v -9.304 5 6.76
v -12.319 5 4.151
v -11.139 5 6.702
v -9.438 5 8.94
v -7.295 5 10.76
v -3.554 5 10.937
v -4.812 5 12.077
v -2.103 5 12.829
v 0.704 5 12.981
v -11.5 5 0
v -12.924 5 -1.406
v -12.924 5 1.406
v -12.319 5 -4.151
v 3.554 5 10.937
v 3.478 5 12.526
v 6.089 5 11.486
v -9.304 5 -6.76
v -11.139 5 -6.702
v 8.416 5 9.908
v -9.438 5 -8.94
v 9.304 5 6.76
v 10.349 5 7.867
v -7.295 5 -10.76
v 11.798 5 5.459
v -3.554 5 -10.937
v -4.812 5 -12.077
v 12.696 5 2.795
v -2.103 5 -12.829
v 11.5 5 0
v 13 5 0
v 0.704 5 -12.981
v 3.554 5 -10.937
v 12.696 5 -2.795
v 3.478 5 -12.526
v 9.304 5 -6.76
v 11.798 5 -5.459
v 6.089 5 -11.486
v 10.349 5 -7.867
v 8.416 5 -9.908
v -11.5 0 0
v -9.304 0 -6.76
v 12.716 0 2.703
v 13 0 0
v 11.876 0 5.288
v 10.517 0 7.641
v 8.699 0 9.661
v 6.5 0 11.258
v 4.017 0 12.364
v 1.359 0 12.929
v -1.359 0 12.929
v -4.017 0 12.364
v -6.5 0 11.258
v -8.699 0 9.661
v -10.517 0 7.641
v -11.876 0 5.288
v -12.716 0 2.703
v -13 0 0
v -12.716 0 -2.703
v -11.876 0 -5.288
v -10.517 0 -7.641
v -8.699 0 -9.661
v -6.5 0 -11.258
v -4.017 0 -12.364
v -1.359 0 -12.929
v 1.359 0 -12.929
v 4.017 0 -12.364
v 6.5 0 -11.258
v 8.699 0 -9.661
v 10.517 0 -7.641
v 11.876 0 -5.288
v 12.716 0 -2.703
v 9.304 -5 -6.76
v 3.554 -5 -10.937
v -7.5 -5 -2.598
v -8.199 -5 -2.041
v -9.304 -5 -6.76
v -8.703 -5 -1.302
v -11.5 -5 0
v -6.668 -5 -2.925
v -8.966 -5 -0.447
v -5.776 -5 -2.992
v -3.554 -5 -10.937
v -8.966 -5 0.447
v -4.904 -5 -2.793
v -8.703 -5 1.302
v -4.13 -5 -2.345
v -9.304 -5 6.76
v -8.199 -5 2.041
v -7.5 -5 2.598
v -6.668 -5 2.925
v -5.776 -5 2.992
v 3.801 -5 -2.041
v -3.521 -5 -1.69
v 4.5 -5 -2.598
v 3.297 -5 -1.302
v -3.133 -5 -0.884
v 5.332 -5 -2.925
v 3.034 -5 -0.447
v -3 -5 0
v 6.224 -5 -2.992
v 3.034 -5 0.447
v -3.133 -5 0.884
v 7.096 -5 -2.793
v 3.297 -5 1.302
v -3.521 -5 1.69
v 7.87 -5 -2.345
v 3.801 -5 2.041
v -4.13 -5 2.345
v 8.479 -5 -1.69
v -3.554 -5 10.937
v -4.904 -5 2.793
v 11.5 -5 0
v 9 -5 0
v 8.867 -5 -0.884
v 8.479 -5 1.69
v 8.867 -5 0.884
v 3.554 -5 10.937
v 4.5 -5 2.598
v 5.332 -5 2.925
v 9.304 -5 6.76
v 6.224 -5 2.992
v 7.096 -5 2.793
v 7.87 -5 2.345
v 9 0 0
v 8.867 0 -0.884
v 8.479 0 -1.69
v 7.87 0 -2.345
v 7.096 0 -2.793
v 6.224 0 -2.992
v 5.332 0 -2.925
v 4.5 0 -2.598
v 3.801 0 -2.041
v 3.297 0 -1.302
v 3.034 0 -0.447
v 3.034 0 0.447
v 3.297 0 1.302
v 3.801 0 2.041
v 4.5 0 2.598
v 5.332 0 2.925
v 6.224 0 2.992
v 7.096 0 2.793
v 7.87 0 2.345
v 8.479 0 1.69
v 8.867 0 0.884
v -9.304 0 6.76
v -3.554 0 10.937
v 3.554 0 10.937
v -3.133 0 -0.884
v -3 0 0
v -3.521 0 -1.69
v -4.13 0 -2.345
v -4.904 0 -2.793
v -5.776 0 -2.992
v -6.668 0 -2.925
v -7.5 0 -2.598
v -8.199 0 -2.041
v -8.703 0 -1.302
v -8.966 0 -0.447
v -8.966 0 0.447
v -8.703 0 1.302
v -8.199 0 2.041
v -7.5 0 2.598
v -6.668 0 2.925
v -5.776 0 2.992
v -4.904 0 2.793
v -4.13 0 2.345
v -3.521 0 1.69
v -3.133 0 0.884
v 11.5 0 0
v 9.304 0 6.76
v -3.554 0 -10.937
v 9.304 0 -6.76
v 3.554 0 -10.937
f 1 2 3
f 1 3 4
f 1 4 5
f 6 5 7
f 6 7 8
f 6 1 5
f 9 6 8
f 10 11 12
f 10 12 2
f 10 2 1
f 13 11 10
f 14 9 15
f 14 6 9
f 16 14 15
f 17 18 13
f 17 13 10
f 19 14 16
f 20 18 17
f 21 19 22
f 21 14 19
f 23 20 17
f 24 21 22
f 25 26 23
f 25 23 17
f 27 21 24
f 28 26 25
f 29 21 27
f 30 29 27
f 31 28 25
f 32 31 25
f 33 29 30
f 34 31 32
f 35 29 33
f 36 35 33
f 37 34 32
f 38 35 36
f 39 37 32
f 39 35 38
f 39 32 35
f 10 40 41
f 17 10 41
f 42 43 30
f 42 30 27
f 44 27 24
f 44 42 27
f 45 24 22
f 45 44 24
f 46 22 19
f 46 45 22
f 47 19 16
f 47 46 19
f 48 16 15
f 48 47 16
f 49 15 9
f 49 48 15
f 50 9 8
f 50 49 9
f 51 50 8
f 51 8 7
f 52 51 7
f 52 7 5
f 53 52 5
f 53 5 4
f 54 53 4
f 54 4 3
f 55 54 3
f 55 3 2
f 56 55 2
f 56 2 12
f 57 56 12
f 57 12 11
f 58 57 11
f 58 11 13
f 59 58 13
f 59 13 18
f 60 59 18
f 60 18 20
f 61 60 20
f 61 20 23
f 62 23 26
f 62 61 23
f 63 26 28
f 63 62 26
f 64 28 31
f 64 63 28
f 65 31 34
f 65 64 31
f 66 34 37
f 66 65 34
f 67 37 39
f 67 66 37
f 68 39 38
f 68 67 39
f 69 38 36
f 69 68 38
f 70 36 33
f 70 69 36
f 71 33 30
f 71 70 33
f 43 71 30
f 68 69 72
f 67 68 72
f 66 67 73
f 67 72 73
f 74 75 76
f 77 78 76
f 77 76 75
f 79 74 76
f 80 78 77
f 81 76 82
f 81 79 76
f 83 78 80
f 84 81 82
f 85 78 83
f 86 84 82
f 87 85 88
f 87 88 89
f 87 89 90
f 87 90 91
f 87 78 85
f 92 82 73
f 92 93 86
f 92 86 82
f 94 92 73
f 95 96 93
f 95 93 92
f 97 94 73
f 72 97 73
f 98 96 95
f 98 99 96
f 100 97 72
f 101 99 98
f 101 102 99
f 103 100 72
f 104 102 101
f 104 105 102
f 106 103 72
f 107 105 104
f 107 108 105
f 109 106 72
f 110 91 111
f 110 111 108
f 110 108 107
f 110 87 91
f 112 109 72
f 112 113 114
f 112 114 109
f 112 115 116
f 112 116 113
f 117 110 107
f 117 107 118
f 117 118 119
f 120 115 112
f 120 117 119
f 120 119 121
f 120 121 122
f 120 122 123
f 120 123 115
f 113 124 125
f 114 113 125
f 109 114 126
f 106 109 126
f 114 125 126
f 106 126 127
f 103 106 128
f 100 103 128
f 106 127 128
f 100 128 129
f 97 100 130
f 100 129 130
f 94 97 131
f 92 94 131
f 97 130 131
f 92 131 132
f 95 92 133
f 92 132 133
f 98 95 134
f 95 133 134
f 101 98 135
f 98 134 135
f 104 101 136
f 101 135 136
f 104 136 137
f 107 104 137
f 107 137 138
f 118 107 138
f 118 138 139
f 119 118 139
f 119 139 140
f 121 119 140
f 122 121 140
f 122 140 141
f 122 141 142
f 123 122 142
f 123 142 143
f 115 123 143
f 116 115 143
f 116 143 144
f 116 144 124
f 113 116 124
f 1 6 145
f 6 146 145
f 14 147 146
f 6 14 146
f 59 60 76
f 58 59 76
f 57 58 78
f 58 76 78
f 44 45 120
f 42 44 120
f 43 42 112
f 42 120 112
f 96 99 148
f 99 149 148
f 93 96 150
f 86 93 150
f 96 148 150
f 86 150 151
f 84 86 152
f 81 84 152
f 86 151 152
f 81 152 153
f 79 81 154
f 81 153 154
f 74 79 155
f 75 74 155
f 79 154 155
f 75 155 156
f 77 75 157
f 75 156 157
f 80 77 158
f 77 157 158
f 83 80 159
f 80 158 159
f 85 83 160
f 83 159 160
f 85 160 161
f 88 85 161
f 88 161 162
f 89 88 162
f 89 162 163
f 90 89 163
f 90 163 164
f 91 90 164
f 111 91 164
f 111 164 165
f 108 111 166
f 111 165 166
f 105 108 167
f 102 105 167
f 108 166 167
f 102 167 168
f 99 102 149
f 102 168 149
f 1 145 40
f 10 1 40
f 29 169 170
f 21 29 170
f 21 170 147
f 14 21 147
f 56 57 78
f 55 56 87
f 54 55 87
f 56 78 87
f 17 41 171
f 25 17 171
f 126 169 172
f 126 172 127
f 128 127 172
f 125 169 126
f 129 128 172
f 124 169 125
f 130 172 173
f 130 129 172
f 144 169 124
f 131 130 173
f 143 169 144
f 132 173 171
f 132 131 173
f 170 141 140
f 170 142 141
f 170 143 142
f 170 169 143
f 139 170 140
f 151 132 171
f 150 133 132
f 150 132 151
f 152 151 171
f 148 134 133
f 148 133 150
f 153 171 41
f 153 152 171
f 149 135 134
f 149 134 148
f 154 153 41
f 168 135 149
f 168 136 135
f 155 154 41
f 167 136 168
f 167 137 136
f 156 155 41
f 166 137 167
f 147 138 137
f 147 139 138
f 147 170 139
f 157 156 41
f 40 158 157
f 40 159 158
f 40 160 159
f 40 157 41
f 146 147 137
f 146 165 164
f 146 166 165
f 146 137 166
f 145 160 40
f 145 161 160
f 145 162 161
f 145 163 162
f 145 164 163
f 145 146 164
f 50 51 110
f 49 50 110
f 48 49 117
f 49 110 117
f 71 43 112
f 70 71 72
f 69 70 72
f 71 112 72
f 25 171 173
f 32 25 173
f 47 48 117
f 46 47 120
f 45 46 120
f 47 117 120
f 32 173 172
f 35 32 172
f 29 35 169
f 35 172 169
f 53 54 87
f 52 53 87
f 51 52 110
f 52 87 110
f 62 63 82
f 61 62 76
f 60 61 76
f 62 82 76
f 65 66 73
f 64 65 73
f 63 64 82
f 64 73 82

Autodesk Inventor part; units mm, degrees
ref_plane "YZ Plane" through (0, 0, 0) normal (1, 0, 0) x (0, 1, 0)
ref_plane "XZ Plane" through (0, 0, 0) normal (0, 1, 0) x (-1, 0, 0)
ref_plane "XY Plane" through (0, 0, 0) normal (0, 0, 1) x (1, 0, 0)
sketch "Sketch1" plane through (0, 0, 0) normal (0, 1, 0) x (-1, 0, 0)
  circle A0 centre (0, 0) radius 13
  line L0 (-11.5, 0) -> (-9.303695, 6.75953) construction
  line L1 (-9.303695, 6.75953) -> (-3.553695, 10.93715) construction
  line L2 (-3.553695, 10.93715) -> (3.553695, 10.93715) construction
  line L3 (3.553695, 10.93715) -> (9.303695, 6.75953) construction
  line L4 (9.303695, 6.75953) -> (11.5, 0) construction
  line L5 (11.5, 0) -> (9.303695, -6.75953) construction
  line L6 (9.303695, -6.75953) -> (3.553695, -10.93715) construction
  line L7 (3.553695, -10.93715) -> (-3.553695, -10.93715) construction
  line L8 (-3.553695, -10.93715) -> (-9.303695, -6.75953) construction
  line L9 (-9.303695, -6.75953) -> (-11.5, 0) construction
  circle A1 centre (-6, 0) radius 3 construction
  circle A2 centre (6, 0) radius 3 construction
  line L10 (13, 0) -> (10.517221, -7.641208) construction
  line L11 (10.517221, -7.641208) -> (4.017221, -12.363735) construction
  line L12 (4.017221, -12.363735) -> (-4.017221, -12.363735) construction
  line L13 (-4.017221, -12.363735) -> (-10.517221, -7.641208) construction
  line L14 (-10.517221, -7.641208) -> (-13, 0) construction
  line L15 (-13, 0) -> (-10.517221, 7.641208) construction
  line L16 (-10.517221, 7.641208) -> (-4.017221, 12.363735) construction
  line L17 (-4.017221, 12.363735) -> (4.017221, 12.363735) construction
  line L18 (4.017221, 12.363735) -> (10.517221, 7.641208) construction
  line L19 (10.517221, 7.641208) -> (13, 0) construction
  dimension "d0" = 26
  dimension "d10" = 6
  dimension "d11" = 6
ref_plane "Work Plane1" through (0, -5, 0) normal (0, -1, 0) x (1, 0, 0)
sketch "Sketch2" plane through (0, -5, 0) normal (0, -1, 0) x (1, 0, 0)
  circle A0 centre (0, 0) radius 13 construction
  line L0 (-9.303695, 6.75953) -> (-11.5, 0)
  line L1 (-11.5, 0) -> (-9.303695, 6.75953)
  line L2 (-9.303695, 6.75953) -> (-3.553695, 10.93715)
  line L3 (-3.553695, 10.93715) -> (3.553695, 10.93715)
  line L4 (3.553695, 10.93715) -> (9.303695, 6.75953)
  line L5 (9.303695, 6.75953) -> (11.5, 0)
  line L6 (11.5, 0) -> (9.303695, -6.75953)
  line L7 (9.303695, -6.75953) -> (3.553695, -10.93715)
  line L8 (3.553695, -10.93715) -> (-3.553695, -10.93715)
  line L9 (-3.553695, -10.93715) -> (-9.303695, -6.75953)
  line L10 (-9.303695, -6.75953) -> (-11.5, 0)
sketch3d "3D Sketch1"
sketch "Sketch1 outline for Loft1" plane through (0, 0, 0) normal (0, 1, 0) x (-1, 0, 0)
  circle A0 centre (0, 0) radius 13
sketch "Sketch2 outline for Loft1" plane through (0, -5, 0) normal (0, -1, 0) x (1, 0, 0)
  line L0 (-11.5, 0) -> (-9.303695, 6.75953)
  line L1 (-9.303695, 6.75953) -> (-3.553695, 10.93715)
  line L2 (-3.553695, 10.93715) -> (3.553695, 10.93715)
  line L3 (3.553695, 10.93715) -> (9.303695, 6.75953)
  line L4 (9.303695, 6.75953) -> (11.5, 0)
  line L5 (11.5, 0) -> (9.303695, -6.75953)
  line L6 (9.303695, -6.75953) -> (3.553695, -10.93715)
  line L7 (3.553695, -10.93715) -> (-3.553695, -10.93715)
  line L8 (-3.553695, -10.93715) -> (-9.303695, -6.75953)
  line L9 (-9.303695, -6.75953) -> (-11.5, 0)
loft "Loft1" add profiles "Sketch1 outline for Loft1", "Sketch2 outline for Loft1"
sketch "Sketch3" plane through (0, 0, 0) normal (0, 1, 0) x (1, 0, 0)
  circle A0 centre (0, 0) radius 13
  line L0 (-11.5, 0) -> (-9.303695, 6.75953)
  line L1 (-9.303695, 6.75953) -> (-3.553695, 10.93715)
  line L2 (-3.553695, 10.93715) -> (3.553695, 10.93715)
  line L3 (3.553695, 10.93715) -> (9.303695, 6.75953)
  line L4 (9.303695, 6.75953) -> (11.5, 0)
  line L5 (11.5, 0) -> (9.303695, -6.75953)
  line L6 (9.303695, -6.75953) -> (3.553695, -10.93715)
  line L7 (3.553695, -10.93715) -> (-3.553695, -10.93715)
  line L8 (-3.553695, -10.93715) -> (-9.303695, -6.75953)
  line L9 (-9.303695, -6.75953) -> (-11.5, 0)
  circle A1 centre (0, 0) radius 13
  line L10 (-11.5, 0) -> (-9.303695, 6.75953)
  line L11 (-9.303695, 6.75953) -> (-3.553695, 10.93715)
  line L12 (-3.553695, 10.93715) -> (3.553695, 10.93715)
  line L13 (3.553695, 10.93715) -> (9.303695, 6.75953)
  line L14 (9.303695, 6.75953) -> (11.5, 0)
  line L15 (11.5, 0) -> (9.303695, -6.75953)
  line L16 (9.303695, -6.75953) -> (3.553695, -10.93715)
  line L17 (3.553695, -10.93715) -> (-3.553695, -10.93715)
  line L18 (-3.553695, -10.93715) -> (-9.303695, -6.75953)
  line L19 (-9.303695, -6.75953) -> (-11.5, 0)
  circle A2 centre (-6, 0) radius 3
  circle A3 centre (6, 0) radius 3
  dimension "d28" = 11.5
  dimension "d29" = 26
  dimension "d30" = 6
  dimension "d31" = 6
extrude "Extrusion4" cut sketch "Sketch3" against normal blind 5 contours A3
extrude "Extrusion5" cut sketch "Sketch3" against normal blind 5 contours A2
extrude "Extrusion6" add sketch "Sketch3" along normal blind 5 contours A0
properties part number "Probe P1.5"
